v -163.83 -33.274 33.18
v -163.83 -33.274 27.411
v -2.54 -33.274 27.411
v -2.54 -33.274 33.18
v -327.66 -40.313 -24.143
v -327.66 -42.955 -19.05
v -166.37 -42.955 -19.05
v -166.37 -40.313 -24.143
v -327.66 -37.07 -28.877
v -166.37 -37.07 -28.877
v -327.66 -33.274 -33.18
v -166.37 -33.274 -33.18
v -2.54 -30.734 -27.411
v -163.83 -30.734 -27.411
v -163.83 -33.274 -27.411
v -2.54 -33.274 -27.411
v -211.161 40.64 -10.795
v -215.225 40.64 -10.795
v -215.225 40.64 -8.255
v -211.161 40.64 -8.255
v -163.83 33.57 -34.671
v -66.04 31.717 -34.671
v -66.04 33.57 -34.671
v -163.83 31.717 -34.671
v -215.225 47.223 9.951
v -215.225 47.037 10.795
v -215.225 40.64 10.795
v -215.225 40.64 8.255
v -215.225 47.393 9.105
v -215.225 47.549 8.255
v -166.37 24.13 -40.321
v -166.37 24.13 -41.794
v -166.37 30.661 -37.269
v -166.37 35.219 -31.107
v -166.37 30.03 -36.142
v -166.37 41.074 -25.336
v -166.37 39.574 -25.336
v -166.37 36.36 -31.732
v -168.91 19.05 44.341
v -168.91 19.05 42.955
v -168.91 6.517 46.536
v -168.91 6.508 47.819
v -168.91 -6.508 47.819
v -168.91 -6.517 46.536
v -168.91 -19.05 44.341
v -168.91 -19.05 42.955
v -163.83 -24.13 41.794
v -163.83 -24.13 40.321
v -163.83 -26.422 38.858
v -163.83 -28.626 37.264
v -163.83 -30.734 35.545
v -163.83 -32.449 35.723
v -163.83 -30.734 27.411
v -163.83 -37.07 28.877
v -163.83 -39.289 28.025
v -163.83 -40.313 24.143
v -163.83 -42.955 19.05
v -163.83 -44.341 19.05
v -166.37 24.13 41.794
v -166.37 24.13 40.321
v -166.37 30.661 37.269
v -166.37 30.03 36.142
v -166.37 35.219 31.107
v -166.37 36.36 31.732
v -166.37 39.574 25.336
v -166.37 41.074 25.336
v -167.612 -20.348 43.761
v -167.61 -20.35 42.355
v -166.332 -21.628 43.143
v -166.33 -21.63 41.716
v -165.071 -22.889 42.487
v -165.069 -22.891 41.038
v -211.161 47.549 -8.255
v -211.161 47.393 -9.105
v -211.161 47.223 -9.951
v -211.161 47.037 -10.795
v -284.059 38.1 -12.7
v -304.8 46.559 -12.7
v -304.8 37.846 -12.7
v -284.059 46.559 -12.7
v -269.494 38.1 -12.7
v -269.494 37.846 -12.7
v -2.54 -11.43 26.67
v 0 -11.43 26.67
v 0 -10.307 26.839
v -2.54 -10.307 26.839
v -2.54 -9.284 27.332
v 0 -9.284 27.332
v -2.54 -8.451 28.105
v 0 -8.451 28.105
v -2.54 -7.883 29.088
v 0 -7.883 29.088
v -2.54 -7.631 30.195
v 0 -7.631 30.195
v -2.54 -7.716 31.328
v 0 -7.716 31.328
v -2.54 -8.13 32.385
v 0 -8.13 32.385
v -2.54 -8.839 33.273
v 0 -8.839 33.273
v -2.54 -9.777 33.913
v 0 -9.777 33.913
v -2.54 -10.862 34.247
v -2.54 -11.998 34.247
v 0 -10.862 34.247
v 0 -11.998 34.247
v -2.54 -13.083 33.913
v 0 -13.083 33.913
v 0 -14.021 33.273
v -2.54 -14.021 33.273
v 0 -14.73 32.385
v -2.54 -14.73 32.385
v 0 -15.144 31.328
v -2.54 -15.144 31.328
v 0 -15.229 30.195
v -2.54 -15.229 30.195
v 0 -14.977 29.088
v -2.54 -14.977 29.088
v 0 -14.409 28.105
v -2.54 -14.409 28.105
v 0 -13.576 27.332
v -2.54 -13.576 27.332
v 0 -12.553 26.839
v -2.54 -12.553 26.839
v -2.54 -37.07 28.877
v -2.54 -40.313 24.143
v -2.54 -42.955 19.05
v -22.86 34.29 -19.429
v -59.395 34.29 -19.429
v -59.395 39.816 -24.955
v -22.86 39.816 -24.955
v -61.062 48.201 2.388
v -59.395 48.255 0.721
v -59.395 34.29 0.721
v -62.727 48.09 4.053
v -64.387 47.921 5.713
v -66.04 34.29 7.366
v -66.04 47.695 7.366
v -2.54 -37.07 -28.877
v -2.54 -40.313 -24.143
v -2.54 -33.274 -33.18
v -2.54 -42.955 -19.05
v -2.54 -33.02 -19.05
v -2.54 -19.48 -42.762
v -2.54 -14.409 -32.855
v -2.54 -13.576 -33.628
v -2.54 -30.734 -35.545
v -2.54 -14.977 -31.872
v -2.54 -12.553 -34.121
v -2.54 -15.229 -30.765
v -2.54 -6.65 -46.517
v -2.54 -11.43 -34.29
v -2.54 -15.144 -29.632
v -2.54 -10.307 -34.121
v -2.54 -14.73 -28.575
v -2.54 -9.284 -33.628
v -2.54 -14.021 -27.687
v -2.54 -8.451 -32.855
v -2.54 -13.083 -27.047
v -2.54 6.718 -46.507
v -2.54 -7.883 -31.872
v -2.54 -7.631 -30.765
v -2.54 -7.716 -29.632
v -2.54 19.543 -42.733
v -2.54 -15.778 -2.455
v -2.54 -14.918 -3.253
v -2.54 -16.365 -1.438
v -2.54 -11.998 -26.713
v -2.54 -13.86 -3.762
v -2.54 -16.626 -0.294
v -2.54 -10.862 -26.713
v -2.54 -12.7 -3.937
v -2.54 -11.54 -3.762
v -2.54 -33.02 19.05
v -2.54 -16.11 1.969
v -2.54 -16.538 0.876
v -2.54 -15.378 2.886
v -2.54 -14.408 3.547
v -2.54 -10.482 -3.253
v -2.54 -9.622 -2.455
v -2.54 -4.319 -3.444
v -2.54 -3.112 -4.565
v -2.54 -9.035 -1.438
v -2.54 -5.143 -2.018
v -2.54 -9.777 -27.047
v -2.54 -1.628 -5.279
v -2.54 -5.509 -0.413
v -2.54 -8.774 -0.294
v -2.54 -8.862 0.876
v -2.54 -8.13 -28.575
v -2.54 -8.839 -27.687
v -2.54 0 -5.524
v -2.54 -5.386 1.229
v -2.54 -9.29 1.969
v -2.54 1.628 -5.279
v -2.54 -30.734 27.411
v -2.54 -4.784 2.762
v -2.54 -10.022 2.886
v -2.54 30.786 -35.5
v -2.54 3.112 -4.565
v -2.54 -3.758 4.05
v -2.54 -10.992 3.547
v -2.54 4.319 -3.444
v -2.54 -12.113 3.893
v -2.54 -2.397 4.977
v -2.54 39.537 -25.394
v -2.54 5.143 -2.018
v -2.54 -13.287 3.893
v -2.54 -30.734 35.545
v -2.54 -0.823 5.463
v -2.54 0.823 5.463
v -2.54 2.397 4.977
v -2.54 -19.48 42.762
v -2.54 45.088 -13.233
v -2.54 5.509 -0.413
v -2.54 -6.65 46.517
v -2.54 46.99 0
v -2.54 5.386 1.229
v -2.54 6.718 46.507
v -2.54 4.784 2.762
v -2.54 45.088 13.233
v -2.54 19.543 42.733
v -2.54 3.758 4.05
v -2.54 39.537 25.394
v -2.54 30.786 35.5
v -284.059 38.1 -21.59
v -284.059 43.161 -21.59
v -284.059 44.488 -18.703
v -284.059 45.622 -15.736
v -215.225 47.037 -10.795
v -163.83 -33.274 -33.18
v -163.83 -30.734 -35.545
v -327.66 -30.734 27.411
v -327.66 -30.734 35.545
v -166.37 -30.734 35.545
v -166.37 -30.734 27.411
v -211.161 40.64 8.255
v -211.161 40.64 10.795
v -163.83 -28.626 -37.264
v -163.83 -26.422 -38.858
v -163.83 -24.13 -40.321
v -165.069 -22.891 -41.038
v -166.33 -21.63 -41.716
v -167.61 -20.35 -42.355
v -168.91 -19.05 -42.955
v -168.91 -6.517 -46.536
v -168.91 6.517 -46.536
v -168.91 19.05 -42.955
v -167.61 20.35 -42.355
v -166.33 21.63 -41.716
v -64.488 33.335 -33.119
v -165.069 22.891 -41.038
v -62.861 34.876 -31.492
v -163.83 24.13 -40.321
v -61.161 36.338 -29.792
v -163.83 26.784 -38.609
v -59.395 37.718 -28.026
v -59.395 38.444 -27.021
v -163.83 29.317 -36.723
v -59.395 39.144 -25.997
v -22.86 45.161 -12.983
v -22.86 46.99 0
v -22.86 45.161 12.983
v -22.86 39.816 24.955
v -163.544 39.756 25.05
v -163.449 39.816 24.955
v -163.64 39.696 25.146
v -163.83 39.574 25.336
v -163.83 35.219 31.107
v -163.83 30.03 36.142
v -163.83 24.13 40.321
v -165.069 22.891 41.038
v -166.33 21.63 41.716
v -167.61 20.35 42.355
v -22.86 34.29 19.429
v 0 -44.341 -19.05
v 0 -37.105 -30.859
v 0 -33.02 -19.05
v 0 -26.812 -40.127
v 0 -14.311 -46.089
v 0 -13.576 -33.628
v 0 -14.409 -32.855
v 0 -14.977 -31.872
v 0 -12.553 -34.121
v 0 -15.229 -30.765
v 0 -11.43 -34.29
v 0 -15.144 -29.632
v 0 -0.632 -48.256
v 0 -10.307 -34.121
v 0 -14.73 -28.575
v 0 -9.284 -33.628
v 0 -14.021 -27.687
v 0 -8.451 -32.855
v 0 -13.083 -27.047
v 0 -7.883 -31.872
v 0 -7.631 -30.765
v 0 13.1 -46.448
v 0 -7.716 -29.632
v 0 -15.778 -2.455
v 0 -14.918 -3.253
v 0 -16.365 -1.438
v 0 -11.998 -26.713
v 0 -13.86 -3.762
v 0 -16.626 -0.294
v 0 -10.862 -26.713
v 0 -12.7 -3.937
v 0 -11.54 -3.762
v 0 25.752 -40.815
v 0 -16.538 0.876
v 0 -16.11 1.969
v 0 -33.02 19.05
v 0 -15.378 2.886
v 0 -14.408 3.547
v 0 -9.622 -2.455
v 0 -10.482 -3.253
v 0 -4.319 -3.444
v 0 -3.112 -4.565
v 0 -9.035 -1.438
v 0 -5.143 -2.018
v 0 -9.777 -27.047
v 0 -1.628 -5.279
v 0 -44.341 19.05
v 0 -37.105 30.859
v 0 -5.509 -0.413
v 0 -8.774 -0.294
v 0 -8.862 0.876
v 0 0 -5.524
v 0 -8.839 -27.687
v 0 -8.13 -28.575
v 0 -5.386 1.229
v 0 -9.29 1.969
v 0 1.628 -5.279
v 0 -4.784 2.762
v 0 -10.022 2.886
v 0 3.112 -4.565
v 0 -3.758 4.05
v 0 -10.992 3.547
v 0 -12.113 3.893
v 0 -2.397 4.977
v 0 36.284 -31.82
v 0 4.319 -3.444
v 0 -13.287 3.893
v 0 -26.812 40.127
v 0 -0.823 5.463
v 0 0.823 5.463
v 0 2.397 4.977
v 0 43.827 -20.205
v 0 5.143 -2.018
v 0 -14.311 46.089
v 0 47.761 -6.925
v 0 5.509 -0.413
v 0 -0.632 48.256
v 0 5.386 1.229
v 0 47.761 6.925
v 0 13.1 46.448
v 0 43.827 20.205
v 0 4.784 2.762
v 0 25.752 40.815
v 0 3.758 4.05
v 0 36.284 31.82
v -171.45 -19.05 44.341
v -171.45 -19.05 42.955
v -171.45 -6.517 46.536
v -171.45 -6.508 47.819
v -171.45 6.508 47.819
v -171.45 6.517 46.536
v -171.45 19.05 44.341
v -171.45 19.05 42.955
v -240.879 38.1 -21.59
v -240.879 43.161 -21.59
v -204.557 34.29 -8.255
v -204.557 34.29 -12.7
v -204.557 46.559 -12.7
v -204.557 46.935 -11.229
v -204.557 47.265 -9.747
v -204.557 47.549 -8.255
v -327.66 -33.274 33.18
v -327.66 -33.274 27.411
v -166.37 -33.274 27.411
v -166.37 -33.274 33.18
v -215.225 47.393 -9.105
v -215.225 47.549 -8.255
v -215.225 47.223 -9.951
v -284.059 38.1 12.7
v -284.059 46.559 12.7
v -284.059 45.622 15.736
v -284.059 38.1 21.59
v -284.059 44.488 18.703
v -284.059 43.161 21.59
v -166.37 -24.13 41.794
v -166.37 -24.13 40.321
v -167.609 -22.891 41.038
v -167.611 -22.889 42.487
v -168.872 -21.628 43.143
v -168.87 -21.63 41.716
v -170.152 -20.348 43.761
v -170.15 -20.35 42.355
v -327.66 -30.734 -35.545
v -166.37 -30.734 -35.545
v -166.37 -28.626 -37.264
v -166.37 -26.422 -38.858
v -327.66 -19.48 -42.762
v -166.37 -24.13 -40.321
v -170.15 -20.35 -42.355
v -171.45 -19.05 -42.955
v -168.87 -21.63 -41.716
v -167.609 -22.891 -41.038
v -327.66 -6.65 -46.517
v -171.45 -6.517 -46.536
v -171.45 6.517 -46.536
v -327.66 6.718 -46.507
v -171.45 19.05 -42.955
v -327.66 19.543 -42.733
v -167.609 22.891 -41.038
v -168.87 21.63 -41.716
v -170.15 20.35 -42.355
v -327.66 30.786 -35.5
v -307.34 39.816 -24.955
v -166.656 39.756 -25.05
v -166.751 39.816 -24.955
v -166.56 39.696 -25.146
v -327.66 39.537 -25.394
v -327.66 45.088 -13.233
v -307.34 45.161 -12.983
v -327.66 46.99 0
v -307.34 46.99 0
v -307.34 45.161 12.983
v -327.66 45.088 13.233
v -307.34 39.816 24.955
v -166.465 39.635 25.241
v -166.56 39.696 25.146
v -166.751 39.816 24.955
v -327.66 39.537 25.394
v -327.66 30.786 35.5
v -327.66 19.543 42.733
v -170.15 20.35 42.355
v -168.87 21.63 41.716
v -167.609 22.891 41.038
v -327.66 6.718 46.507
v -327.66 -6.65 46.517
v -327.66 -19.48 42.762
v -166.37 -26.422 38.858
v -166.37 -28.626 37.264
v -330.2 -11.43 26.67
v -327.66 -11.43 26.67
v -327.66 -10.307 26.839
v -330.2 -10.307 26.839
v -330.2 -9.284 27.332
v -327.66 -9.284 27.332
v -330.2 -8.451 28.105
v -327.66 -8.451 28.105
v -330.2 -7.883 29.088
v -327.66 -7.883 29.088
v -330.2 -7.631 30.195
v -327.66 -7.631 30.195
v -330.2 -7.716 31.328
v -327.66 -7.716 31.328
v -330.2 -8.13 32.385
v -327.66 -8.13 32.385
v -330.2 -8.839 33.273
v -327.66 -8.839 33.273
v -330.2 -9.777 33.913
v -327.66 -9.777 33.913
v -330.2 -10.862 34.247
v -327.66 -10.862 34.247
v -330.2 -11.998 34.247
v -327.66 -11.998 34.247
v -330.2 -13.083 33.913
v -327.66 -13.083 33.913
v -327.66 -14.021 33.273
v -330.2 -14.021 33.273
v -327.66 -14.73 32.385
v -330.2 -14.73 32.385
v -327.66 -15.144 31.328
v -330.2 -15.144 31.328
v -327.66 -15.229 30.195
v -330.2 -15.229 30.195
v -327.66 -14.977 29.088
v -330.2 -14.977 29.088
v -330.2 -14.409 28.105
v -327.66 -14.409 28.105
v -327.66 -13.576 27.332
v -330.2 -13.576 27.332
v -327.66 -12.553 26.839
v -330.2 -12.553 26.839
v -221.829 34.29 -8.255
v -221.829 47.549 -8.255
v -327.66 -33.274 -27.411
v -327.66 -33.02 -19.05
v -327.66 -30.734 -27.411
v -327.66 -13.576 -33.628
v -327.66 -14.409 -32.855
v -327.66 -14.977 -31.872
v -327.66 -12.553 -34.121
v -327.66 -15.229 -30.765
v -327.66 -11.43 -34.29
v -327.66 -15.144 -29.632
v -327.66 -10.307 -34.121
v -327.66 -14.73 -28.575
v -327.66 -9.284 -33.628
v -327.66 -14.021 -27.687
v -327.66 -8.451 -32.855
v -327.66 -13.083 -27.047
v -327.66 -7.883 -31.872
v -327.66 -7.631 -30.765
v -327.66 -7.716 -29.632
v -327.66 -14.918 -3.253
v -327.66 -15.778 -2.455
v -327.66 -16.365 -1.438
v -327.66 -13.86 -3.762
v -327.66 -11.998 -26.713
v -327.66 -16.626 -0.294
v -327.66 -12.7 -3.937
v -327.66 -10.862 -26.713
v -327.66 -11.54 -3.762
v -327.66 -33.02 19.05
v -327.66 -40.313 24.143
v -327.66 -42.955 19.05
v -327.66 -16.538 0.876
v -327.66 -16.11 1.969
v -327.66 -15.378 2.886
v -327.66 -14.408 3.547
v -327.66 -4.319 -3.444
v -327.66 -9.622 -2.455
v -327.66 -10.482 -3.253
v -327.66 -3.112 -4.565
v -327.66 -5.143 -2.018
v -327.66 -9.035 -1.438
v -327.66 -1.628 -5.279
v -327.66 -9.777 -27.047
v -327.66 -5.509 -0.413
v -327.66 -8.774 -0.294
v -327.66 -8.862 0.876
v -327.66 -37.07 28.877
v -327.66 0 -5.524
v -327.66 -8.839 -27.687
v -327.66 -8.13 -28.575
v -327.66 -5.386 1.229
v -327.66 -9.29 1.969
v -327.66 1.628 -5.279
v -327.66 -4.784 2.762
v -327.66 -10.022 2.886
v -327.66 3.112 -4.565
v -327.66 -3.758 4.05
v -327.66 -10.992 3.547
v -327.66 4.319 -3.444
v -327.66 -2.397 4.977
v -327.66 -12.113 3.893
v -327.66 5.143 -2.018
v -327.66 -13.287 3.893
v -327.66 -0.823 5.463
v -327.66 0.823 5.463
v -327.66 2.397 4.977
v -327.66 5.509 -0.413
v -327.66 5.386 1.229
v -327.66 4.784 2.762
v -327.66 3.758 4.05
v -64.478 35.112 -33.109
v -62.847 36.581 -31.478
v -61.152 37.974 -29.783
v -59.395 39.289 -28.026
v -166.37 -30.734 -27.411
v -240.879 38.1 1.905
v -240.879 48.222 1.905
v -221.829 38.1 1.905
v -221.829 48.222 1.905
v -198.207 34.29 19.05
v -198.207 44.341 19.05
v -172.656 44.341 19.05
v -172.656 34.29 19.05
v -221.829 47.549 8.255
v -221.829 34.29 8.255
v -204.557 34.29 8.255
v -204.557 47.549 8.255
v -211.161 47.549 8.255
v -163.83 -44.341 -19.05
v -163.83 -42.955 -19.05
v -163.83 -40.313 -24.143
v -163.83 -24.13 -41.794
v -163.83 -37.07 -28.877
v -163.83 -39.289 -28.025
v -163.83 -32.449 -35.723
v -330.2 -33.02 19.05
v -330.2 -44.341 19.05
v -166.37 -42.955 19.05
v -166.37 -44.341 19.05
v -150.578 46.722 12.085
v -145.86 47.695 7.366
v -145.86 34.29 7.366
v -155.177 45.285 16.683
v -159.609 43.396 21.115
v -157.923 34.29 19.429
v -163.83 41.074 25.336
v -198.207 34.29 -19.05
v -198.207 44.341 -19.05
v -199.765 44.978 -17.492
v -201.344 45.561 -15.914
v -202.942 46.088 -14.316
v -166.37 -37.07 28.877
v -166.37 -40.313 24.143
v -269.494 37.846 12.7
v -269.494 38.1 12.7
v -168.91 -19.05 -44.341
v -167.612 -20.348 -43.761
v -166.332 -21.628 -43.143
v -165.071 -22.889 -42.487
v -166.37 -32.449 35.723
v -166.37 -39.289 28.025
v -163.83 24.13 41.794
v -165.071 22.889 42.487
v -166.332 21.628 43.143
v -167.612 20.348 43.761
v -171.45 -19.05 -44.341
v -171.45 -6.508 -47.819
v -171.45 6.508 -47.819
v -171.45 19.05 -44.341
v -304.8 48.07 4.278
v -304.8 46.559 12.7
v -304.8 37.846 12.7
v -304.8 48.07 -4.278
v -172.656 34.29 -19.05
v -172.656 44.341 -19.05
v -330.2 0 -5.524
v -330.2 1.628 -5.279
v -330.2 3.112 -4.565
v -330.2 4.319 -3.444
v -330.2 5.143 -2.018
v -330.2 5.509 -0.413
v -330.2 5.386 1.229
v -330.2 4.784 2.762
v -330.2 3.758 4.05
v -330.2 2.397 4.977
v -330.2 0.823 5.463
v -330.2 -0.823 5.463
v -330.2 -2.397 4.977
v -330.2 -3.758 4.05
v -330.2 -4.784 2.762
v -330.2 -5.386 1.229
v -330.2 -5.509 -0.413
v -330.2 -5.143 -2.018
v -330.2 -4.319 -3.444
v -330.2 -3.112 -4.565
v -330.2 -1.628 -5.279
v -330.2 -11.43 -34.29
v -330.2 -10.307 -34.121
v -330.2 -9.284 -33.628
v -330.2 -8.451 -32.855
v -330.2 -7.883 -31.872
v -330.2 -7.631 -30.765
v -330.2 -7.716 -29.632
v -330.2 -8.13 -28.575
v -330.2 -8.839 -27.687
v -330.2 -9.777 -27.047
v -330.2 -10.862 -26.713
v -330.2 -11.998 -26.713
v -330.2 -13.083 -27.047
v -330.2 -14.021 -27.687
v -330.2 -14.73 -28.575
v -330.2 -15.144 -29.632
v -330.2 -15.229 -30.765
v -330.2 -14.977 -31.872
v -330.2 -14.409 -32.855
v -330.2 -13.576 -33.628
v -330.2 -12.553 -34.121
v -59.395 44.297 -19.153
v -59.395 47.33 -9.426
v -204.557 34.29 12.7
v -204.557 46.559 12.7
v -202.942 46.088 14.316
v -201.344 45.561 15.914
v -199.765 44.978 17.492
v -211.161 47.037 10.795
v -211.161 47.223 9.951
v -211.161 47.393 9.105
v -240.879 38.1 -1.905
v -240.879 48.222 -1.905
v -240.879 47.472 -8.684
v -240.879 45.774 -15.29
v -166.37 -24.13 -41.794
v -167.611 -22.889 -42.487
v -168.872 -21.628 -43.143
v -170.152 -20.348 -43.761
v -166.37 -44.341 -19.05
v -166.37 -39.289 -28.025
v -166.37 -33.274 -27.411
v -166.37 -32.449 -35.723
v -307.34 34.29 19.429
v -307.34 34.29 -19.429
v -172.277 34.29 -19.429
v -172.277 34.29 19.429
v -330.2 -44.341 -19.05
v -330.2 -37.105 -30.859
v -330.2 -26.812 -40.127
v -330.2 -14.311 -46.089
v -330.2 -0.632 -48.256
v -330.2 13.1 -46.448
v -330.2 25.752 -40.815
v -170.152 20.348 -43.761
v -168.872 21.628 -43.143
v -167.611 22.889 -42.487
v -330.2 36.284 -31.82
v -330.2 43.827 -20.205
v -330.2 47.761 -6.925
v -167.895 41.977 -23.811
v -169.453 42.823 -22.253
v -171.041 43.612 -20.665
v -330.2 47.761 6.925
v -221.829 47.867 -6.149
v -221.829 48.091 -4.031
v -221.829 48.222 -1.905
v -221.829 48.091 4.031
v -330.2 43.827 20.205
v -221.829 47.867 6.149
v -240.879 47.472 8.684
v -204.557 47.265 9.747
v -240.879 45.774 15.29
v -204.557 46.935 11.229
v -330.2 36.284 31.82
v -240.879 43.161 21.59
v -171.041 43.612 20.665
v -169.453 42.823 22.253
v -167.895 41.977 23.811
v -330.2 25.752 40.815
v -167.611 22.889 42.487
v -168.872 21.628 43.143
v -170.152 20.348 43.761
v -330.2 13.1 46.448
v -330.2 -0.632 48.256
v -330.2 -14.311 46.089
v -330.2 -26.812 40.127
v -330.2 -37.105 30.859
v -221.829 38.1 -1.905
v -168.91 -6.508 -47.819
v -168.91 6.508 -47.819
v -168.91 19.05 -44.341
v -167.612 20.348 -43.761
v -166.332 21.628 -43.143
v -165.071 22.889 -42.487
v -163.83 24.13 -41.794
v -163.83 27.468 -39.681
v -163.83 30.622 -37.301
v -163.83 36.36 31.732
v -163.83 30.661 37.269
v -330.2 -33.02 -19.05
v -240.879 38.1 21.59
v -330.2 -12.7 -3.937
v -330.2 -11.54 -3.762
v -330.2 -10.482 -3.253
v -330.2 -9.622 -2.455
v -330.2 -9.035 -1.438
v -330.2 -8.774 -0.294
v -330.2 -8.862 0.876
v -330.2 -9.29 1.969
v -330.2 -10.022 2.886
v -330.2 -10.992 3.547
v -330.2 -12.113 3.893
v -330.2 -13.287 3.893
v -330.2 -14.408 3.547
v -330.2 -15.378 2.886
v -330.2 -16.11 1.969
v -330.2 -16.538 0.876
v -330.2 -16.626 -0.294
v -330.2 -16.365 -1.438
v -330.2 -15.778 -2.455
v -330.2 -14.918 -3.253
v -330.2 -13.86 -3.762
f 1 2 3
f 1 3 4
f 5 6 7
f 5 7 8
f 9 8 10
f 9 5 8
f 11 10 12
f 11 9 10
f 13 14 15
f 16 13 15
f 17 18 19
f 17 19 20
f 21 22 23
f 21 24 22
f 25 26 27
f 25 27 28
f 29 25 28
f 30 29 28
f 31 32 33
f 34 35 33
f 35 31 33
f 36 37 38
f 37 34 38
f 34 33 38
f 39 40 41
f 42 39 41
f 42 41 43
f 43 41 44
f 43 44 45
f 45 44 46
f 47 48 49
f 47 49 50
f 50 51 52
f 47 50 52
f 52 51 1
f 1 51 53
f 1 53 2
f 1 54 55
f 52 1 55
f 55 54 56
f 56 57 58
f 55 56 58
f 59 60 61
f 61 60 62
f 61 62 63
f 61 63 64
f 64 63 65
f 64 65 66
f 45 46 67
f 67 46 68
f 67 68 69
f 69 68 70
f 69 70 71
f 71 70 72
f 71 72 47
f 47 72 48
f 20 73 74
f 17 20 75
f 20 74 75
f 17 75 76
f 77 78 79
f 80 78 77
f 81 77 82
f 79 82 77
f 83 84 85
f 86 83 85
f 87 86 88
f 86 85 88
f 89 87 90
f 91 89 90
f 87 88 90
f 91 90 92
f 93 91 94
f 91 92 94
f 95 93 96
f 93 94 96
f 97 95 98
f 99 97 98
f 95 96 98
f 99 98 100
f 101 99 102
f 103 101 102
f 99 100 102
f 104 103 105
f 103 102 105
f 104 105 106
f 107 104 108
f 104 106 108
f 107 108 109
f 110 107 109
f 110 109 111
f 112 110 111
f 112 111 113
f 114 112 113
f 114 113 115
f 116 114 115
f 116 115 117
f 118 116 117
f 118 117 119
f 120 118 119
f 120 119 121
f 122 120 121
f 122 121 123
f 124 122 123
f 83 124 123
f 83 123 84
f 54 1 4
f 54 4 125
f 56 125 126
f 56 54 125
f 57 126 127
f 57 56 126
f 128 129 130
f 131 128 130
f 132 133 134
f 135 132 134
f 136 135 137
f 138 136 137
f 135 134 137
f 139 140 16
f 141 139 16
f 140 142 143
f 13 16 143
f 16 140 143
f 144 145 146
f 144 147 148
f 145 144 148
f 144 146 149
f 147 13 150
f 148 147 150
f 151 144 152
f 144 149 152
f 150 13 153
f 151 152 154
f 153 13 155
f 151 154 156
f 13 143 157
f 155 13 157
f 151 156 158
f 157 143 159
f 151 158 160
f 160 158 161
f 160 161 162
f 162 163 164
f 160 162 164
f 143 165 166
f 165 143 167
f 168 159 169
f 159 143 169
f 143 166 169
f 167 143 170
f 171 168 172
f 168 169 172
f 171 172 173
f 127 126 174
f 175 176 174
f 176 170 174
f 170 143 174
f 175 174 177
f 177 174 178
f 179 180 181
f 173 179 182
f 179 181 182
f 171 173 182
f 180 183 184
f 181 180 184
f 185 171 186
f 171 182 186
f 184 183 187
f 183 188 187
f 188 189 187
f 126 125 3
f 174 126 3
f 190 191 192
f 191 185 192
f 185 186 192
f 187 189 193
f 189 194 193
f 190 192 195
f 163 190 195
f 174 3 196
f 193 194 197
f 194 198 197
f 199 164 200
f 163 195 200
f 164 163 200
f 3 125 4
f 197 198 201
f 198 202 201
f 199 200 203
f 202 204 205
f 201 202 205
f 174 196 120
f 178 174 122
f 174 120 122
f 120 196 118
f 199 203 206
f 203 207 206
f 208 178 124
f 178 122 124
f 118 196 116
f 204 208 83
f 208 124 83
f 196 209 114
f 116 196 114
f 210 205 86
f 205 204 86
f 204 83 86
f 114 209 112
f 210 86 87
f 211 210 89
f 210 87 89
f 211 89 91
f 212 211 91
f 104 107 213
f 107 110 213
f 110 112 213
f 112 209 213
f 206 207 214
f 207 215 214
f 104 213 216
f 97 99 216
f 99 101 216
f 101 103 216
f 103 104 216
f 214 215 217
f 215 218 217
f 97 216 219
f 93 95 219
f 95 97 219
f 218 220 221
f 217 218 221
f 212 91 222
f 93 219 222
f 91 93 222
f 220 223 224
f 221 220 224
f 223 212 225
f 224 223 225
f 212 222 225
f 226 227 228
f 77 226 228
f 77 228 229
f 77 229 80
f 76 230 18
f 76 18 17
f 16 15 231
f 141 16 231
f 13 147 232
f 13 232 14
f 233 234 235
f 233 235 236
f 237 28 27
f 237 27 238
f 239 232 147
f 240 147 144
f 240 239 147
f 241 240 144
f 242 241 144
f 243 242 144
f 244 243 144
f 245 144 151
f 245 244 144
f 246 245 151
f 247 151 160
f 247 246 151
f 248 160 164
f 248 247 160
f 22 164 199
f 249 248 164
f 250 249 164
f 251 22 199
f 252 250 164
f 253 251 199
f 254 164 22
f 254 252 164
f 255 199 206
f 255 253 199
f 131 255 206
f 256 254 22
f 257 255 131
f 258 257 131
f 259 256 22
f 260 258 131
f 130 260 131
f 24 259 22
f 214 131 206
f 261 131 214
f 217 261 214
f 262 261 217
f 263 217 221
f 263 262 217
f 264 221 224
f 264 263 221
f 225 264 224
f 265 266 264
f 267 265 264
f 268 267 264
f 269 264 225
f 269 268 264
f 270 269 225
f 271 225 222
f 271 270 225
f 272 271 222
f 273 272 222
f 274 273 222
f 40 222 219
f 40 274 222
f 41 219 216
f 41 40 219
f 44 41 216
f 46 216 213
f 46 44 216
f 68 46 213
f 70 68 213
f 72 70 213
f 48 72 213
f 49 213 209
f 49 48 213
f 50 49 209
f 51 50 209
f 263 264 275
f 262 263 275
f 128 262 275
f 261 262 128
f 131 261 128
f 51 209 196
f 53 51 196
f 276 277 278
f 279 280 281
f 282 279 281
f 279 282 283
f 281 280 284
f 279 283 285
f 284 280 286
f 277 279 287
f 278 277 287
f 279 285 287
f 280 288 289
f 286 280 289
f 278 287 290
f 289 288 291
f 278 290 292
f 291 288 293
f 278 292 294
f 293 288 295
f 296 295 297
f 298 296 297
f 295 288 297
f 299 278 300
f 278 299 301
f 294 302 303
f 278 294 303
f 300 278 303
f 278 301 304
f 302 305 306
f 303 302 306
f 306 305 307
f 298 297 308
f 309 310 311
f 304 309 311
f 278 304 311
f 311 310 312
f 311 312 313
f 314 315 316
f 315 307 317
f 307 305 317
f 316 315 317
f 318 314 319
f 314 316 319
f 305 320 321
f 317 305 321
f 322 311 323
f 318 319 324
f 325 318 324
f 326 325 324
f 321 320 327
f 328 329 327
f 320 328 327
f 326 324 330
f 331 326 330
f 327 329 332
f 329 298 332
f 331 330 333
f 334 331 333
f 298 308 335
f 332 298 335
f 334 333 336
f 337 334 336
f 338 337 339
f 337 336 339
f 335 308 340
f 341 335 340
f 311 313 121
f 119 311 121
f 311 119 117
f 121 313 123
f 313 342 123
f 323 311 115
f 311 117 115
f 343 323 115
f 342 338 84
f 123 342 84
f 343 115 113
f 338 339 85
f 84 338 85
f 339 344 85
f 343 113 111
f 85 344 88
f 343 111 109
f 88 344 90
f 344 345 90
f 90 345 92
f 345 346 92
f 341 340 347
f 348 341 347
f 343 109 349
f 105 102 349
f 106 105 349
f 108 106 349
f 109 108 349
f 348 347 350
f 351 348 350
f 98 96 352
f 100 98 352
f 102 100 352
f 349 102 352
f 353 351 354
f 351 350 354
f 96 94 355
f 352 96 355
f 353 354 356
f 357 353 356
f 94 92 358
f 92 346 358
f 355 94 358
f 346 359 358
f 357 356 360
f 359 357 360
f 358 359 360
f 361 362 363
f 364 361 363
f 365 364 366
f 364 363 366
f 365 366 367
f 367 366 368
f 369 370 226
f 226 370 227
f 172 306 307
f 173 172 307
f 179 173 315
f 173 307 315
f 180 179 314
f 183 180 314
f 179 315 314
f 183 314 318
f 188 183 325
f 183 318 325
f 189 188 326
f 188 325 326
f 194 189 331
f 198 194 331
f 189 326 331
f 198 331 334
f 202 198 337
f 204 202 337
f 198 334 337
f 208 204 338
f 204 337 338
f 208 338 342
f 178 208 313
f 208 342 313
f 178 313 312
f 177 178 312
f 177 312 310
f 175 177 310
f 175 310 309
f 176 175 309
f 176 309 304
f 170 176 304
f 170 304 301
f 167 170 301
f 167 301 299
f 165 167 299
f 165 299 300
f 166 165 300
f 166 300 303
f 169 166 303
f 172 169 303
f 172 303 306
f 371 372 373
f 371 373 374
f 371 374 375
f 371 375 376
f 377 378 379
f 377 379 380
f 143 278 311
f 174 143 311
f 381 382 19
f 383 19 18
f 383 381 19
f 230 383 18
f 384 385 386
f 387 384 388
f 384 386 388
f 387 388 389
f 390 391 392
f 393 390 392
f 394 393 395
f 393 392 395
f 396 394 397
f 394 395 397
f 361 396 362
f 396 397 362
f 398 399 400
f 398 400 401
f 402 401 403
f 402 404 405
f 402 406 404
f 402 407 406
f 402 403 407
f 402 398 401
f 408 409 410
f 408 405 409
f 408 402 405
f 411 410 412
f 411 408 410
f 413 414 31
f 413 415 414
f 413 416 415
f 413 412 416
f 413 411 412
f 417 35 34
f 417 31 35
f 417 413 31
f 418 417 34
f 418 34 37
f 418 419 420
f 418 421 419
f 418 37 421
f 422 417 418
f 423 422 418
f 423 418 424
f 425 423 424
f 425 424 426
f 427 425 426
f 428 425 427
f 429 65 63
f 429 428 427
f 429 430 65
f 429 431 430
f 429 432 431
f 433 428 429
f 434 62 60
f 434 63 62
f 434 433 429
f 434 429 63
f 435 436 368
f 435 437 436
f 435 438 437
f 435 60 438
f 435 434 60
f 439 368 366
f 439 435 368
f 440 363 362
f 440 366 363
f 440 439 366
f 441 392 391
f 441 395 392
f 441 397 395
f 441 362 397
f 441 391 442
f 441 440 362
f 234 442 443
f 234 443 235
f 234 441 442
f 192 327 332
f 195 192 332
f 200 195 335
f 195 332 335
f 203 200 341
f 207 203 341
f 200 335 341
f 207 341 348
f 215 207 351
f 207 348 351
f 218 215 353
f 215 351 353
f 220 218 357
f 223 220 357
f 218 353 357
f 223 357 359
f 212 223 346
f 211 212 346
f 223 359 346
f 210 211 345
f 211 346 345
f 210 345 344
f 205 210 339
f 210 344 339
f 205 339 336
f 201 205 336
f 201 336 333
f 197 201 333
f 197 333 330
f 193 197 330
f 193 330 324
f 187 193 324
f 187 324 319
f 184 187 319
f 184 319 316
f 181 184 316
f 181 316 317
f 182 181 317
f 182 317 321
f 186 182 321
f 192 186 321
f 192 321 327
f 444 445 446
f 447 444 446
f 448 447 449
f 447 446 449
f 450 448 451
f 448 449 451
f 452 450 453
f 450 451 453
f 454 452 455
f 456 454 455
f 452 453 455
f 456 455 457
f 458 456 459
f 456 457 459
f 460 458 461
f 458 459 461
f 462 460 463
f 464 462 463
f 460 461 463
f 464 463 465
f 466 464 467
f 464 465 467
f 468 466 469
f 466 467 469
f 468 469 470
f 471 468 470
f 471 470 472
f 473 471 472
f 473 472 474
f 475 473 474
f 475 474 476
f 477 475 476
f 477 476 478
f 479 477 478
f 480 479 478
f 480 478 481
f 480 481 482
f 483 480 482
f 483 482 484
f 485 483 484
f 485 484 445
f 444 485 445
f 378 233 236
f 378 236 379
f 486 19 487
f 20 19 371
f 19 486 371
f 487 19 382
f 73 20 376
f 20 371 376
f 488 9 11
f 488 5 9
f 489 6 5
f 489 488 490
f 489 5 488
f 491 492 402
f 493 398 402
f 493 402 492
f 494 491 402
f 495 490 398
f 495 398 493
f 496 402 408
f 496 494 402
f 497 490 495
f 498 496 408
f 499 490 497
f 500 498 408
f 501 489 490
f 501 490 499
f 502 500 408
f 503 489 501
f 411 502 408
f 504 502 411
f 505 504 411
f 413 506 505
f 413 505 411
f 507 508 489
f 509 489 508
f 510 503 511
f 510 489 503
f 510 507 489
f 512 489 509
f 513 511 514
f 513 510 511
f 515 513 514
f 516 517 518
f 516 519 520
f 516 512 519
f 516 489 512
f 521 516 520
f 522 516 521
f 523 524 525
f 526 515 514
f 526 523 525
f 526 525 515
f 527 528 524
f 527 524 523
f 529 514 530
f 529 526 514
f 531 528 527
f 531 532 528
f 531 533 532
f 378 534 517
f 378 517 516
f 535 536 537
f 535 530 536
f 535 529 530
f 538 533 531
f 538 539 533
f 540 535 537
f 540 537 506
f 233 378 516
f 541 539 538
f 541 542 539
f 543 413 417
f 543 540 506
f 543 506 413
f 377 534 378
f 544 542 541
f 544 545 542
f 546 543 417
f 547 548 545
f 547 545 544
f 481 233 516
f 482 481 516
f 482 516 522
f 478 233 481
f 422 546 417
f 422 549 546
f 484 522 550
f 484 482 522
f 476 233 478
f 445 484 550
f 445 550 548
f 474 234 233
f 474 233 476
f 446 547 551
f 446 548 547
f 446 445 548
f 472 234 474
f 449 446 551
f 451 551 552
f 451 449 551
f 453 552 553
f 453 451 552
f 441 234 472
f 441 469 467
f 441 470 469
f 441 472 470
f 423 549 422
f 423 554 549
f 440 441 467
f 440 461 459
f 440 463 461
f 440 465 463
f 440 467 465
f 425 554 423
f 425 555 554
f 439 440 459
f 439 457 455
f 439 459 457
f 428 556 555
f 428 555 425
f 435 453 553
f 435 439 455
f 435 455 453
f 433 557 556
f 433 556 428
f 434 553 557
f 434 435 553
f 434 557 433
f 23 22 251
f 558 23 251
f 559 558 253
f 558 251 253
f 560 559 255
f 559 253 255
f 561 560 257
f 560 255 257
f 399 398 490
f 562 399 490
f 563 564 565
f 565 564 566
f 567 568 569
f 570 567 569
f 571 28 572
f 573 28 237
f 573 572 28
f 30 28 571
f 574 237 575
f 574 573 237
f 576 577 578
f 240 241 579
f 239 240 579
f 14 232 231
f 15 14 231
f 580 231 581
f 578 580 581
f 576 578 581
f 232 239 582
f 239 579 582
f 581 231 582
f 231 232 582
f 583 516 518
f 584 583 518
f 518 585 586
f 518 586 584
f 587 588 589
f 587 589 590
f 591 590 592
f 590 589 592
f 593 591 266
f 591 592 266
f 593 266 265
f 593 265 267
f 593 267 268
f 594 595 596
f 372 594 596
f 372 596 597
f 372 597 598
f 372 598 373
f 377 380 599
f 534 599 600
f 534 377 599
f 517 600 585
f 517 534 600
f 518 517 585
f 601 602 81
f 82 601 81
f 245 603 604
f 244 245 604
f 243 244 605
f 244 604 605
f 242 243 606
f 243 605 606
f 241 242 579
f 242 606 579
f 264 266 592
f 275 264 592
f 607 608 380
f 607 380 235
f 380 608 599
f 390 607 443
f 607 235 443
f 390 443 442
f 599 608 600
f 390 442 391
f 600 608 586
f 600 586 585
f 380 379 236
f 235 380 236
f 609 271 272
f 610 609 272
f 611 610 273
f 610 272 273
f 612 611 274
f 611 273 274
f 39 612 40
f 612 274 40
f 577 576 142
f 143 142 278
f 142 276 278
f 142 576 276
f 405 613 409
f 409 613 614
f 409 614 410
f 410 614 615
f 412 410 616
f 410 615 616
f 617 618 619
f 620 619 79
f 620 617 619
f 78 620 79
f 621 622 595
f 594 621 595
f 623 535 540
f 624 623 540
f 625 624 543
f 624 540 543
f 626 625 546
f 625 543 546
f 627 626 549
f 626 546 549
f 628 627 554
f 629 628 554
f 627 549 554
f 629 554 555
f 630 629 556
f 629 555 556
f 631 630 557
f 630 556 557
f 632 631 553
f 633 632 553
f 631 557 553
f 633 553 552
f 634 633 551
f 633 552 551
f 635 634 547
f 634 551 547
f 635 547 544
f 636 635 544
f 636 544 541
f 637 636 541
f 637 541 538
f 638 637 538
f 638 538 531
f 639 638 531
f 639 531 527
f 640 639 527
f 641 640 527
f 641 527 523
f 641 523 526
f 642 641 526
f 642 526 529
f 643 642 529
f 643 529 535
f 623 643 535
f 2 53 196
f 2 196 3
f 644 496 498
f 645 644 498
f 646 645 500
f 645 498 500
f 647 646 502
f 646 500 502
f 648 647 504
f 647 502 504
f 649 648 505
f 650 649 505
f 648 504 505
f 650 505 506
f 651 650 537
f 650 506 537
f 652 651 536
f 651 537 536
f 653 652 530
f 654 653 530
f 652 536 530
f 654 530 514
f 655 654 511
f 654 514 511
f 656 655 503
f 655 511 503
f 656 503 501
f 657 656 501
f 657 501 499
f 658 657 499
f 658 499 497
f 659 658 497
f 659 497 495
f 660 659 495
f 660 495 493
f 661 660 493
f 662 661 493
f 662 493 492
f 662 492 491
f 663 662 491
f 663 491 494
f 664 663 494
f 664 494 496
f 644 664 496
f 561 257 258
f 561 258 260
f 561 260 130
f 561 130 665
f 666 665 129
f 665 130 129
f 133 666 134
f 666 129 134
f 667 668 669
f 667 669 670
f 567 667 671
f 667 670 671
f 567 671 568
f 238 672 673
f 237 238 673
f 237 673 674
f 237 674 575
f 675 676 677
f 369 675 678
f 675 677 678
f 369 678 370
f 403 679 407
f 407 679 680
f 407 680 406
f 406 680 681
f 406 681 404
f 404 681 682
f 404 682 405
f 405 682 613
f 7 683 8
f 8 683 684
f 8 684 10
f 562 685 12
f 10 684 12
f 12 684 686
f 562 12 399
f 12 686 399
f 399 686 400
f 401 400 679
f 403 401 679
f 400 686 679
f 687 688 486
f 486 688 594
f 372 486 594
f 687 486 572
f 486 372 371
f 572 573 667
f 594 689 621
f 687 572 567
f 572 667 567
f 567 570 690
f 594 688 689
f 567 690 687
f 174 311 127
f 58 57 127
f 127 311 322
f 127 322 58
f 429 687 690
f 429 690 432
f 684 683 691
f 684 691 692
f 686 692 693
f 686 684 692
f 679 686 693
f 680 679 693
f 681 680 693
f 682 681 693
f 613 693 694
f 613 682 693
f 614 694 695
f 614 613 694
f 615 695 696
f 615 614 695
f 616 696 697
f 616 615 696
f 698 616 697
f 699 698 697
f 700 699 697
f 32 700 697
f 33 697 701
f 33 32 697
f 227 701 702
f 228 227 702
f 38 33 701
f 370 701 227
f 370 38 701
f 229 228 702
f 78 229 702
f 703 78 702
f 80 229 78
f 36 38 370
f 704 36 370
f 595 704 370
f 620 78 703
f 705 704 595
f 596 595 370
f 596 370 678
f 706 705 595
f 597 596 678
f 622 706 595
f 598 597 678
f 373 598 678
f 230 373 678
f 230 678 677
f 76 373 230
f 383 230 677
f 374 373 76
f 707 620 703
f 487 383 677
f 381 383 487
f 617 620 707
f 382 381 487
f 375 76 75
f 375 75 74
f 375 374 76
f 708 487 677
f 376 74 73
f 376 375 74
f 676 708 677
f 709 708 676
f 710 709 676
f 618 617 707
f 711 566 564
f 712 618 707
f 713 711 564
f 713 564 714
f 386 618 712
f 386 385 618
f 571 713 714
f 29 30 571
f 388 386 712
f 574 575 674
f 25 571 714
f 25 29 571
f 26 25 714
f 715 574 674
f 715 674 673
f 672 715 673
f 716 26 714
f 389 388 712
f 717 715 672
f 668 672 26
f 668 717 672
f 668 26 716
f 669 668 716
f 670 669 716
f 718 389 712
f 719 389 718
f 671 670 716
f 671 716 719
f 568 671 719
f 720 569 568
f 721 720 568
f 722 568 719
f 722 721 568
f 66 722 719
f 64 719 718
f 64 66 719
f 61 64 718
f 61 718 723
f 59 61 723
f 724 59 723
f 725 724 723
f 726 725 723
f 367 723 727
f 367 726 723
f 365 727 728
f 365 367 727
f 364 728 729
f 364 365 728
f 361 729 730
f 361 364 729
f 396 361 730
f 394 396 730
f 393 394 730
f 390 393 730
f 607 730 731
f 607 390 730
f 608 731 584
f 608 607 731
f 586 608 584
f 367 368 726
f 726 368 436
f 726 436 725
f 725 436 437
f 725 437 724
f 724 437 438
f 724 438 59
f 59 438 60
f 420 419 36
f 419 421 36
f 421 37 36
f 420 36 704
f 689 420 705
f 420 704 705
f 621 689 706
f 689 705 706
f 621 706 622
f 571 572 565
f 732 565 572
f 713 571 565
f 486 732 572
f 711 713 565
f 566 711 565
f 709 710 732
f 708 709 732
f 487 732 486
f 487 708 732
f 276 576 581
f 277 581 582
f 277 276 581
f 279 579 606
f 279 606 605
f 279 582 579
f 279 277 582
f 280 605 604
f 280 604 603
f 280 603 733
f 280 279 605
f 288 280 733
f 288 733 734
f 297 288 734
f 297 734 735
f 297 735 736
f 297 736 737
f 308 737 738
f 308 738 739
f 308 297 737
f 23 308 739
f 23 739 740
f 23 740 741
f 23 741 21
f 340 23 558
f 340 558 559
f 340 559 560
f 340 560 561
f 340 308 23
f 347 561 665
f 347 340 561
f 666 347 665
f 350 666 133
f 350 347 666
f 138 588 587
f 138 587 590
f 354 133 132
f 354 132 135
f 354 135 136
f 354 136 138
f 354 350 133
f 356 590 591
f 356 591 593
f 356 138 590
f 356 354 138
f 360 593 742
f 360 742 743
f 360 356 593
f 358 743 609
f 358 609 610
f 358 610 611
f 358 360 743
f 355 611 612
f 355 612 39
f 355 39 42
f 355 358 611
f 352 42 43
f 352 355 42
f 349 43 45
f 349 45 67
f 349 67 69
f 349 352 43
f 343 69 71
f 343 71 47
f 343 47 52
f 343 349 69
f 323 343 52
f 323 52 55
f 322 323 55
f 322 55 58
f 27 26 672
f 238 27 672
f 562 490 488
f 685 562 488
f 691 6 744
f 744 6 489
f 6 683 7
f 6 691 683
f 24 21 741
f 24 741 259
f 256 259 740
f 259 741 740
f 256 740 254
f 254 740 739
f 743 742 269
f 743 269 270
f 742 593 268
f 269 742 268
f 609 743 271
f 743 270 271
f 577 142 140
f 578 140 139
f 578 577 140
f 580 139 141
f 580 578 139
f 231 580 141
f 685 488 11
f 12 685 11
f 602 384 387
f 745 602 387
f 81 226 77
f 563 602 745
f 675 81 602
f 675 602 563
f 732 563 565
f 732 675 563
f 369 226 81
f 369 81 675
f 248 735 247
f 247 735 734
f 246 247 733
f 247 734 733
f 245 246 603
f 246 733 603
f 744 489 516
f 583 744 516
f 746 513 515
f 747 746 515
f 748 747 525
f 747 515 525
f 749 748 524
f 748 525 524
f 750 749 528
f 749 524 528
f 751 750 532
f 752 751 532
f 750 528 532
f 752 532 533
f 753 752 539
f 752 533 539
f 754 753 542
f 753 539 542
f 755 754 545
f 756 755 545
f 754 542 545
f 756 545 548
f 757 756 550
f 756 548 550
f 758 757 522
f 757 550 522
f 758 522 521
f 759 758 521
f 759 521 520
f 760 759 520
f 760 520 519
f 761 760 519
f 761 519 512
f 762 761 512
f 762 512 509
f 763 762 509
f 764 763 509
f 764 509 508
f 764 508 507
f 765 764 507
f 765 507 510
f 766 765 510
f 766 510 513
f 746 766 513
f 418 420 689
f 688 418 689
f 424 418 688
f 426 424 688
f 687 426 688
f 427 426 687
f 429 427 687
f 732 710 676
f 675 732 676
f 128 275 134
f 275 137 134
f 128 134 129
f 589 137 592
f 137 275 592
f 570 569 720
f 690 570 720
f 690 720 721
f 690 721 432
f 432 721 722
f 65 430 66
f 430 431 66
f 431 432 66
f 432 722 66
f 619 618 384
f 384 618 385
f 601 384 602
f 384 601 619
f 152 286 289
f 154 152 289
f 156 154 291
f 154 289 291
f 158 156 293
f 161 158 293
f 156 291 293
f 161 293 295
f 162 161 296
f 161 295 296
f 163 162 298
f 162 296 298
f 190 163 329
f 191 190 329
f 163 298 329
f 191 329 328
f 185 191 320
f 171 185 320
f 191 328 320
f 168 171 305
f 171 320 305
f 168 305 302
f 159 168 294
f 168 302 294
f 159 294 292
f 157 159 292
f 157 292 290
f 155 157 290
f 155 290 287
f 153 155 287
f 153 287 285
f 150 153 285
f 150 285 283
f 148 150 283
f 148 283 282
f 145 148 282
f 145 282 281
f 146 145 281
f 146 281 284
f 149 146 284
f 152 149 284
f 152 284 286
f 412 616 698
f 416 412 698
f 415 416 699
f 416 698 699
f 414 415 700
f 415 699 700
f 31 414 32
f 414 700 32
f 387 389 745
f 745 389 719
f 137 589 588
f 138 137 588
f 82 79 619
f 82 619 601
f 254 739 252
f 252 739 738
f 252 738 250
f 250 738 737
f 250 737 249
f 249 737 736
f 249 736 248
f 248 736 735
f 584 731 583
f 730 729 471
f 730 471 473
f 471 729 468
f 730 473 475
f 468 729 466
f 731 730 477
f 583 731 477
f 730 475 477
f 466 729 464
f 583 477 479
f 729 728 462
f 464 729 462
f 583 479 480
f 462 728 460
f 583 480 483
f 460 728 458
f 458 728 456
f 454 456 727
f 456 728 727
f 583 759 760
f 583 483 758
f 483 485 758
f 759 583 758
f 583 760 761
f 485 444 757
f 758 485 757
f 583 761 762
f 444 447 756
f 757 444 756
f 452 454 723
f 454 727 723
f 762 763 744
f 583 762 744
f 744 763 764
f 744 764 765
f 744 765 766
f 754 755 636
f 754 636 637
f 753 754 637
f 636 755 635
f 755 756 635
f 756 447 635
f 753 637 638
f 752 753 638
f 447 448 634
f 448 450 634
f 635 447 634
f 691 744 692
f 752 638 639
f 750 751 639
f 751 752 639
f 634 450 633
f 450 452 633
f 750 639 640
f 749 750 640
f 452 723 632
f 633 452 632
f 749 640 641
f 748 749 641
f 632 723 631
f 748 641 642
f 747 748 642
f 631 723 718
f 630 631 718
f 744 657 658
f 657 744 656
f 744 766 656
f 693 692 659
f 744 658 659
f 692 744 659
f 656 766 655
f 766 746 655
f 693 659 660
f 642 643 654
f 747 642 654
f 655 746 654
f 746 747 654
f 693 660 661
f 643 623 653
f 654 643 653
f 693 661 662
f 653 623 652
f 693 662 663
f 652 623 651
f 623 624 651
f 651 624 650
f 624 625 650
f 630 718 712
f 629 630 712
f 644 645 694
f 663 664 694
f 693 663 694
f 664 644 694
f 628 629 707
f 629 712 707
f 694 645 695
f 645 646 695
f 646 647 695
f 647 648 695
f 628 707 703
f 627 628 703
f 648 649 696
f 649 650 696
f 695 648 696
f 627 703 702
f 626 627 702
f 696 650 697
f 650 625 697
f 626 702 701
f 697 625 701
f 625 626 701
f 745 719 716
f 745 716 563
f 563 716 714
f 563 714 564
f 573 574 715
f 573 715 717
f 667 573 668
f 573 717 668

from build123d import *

# Parameters (mm, degrees)
SKETCH1_R                   = 49.53
CAN_BODY_DEPTH              = 330.2
SEPARATION_DEPTH            = 304.8
SEPARATION_DEPTH_BACK       = 304.8
SHELL1_START                = -327.66
SHELL1_OUTLINE_R            = 46.99
SHELL1_DEPTH                = 161.29
SHELL2_START                = -168.91
SHELL2_OUTLINE_R            = 46.99
SHELL2_DEPTH                = 166.37
SKETCH3_R                   = 3.81
SKETCH3_R_2                 = 3.937
CORD_AND_ROD_CUTS_DEPTH     = 344.424
BOTTOM_RETENTION_RAIL_DEPTH = 140.97
POWER_SWITCH_SLOT_DEPTH     = 35.56
TOP_RETENTION_RIDGE_DEPTH   = 140.97
SKETCH9_R                   = 5.5245
CENTER_HOLE_DEPTH           = 368.3
TOP_GUIDE_RAIL_DEPTH        = 163.83
BOTTOM_START                = -166.37
BOTTOM_GUIDE_RAIL_DEPTH     = 163.576
GOPRO_SLOT_DEPTH            = 2.54
GOPRO_SLOT_DEPTH_BACK       = 96.012
GOPRO_SLOT_START            = -68.58
SKETCH14_W                  = 42.037
SKETCH14_H                  = 58.42
SKETCH13_W                  = 132.445406608
SKETCH13_H                  = 121.677106584
SKETCH13_R                  = 48.26
TOLERANCE_ADJUST_DEPTH      = 343.662
GOPRO_SLOT_CORNERS_DEPTH    = 96.012
SKETCH18_W                  = 16.51
SKETCH18_H                  = 25.4
RUNCAM_CAMERA_CUTOUT_DEPTH  = 17.272
SKETCH19_W                  = 4.064
SKETCH19_H                  = 2.54
CUT_EXTRUDE1_DEPTH          = 7.62
CUT_EXTRUDE2_DEPTH          = 10.16
SKETCH21_W                  = 35.306
SKETCH21_H                  = 25.4
CUT_EXTRUDE3_DEPTH          = 10.414


# Read off the part's stored shape, not the designer's step: Shell1, Shell2
with BuildPart() as part:
    # Sketch1 → Can Body (new body)
    with BuildSketch(Plane(origin=(0, 0, 0), x_dir=(0, 0, -1), z_dir=(1, 0, 0))):
        Circle(SKETCH1_R)
    extrude(amount=-CAN_BODY_DEPTH)

    # Sketch2 → Separation (cut, two sides: drawn at the far end of the back side and taken through both)
    with BuildSketch(Plane.XY.offset(-SEPARATION_DEPTH_BACK)):
        Polygon((-168.91, 19.05), (-168.91, -19.05), (-163.83, -24.13), (-163.83, -49.53), (-166.37, -49.53), (-166.37, -24.13), (-171.45, -19.05), (-171.45, 19.05), (-166.37, 24.13), (-166.37, 49.53), (-163.83, 49.53), (-163.83, 24.13), align=None)
    extrude(amount=SEPARATION_DEPTH + SEPARATION_DEPTH_BACK, mode=Mode.SUBTRACT)


with BuildPart() as separation_piece_1:
    # of the separate pieces the step leaves, piece 1, a body of its own (separation_pieces)
    add(part.part.solids().sort_by_distance((0, 0, -49.53))[0])

    # Shell2 outline → Shell2 (cut)
    with BuildSketch(Plane.YZ.offset(SHELL2_START)):
        Circle(SHELL2_OUTLINE_R)
    extrude(amount=SHELL2_DEPTH, mode=Mode.SUBTRACT)


with BuildPart() as separation_piece_2:
    # of the separate pieces the step leaves, piece 2, a body of its own (separation_pieces)
    add(part.part.solids().sort_by_distance((-171.45, 0, -49.53))[0])

    # Shell1 outline → Shell1 (cut)
    with BuildSketch(Plane.YZ.offset(SHELL1_START)):
        Circle(SHELL1_OUTLINE_R)
    extrude(amount=SHELL1_DEPTH, mode=Mode.SUBTRACT)


with BuildPart() as cord_and_rod_cuts_tool:
    # Sketch3 → Cord and rod cuts (new body)
    with BuildSketch(Plane(origin=(0, 0, 0), x_dir=(0, 0, -1), z_dir=(1, 0, 0))):
        with Locations((-30.48, -11.43)):
            Circle(SKETCH3_R)
        with Locations((30.48, -11.43)):
            Circle(SKETCH3_R)
        with Locations((0, -12.7)):
            Circle(SKETCH3_R_2)
        Polygon((19.05, -33.02), (-19.05, -33.02), (-19.05, -45.72), (-19.05, -57.214809543), (19.05, -57.214809543), (19.05, -45.72), align=None)
    extrude(amount=-CORD_AND_ROD_CUTS_DEPTH)


with BuildPart() as separation_piece_1_1:
    add(separation_piece_1.part)

    # Cord and rod cuts: cut by cord_and_rod_cuts_tool
    add(cord_and_rod_cuts_tool.part, mode=Mode.SUBTRACT)

    # Sketch7 → Top Retention Ridge (add)
    with BuildSketch(Plane.ZY.offset(163.83)):
        with BuildLine():
            Line((19.428741027, 34.29), (-19.428741027, 34.29))
            Line((-19.428741027, 34.29), (-24.954796178, 39.81605515))
            ThreePointArc((-24.954796178, 39.81605515), (0, 46.99), (24.954796178, 39.81605515))
            Line((24.954796178, 39.81605515), (19.428741027, 34.29))
        make_face()
    extrude(amount=-TOP_RETENTION_RIDGE_DEPTH)


with BuildPart() as separation_piece_2_1:
    add(separation_piece_2.part)

    # Cord and rod cuts: cut by cord_and_rod_cuts_tool
    add(cord_and_rod_cuts_tool.part, mode=Mode.SUBTRACT)

    # Sketch4 → Bottom Retention Rail (add)
    with BuildSketch(Plane(origin=(-166.37, 0, 0), x_dir=(0, 0, -1), z_dir=(1, 0, 0))):
        with BuildLine():
            Line((-7.62, 34.29), (-19.428741027, 34.29))
            Line((-19.428741027, 34.29), (-24.954796178, 39.81605515))
            ThreePointArc((-24.954796178, 39.81605515), (0, 46.99), (24.954796178, 39.81605515))
            Line((24.954796178, 39.81605515), (19.428741027, 34.29))
            Line((19.428741027, 34.29), (7.62, 34.29))
            Line((7.62, 34.29), (-7.62, 34.29))
        make_face()
    extrude(amount=-BOTTOM_RETENTION_RAIL_DEPTH)

    # Sketch5 → Power Switch Slot (cut)
    with BuildSketch(Plane(origin=(0, 49.53, 0), x_dir=(1, 0, 0), z_dir=(0, 1, 0))):
        Polygon((-204.557426539, 12.7), (-204.557426539, -12.7), (-198.207426539, -19.05), (-172.656179285, -19.05), (-166.37, -25.336179285), (-166.37, 25.336179285), (-172.656179285, 19.05), (-198.207426539, 19.05), align=None)
    extrude(amount=-POWER_SWITCH_SLOT_DEPTH, mode=Mode.SUBTRACT)


with BuildPart() as center_hole_tool:
    # Sketch9 → Center Hole (new body)
    with BuildSketch(Plane(origin=(0, 0, 0), x_dir=(0, 0, -1), z_dir=(1, 0, 0))):
        Circle(SKETCH9_R)
    extrude(amount=-CENTER_HOLE_DEPTH)


with BuildPart() as separation_piece_1_2:
    add(separation_piece_1_1.part)

    # Center Hole: cut by center_hole_tool
    add(center_hole_tool.part, mode=Mode.SUBTRACT)

    # Sketch10 → Top Guide Rail (add)
    with BuildSketch(Plane(origin=(0, 0, 0), x_dir=(0, 0, -1), z_dir=(1, 0, 0))):
        Polygon((-38.841242823, -30.734), (-27.411242823, -30.734), (-27.411242823, -33.274), (-36.688715213, -33.274), (-37.233551179, -31.620508339), align=None)
        Polygon((37.233551179, -31.620508339), (38.841242823, -30.734), (27.411242823, -30.734), (27.411242823, -33.274), (36.688715213, -33.274), align=None)
    extrude(amount=-TOP_GUIDE_RAIL_DEPTH)

    # Sketch14 → GoPro Slot (cut, two sides: drawn at the far end of the back side and taken through both)
    with BuildSketch(Plane(origin=(0, 0, 0), x_dir=(0, 0, -1), z_dir=(1, 0, 0)).offset(GOPRO_SLOT_START - GOPRO_SLOT_DEPTH_BACK)):
        with Locations((13.6525, 29.21)):
            Rectangle(SKETCH14_W, SKETCH14_H)
    extrude(amount=GOPRO_SLOT_DEPTH + GOPRO_SLOT_DEPTH_BACK, mode=Mode.SUBTRACT)


with BuildPart() as separation_piece_2_2:
    add(separation_piece_2_1.part)

    # Center Hole: cut by center_hole_tool
    add(center_hole_tool.part, mode=Mode.SUBTRACT)

    # Sketch10<2> → Bottom Guide Rail (add)
    with BuildSketch(Plane(origin=(0, 0, 0), x_dir=(0, 0, -1), z_dir=(1, 0, 0)).offset(BOTTOM_START)):
        Polygon((-38.841242823, -30.734), (-27.411242823, -30.734), (-27.411242823, -33.274), (-36.688715213, -33.274), (-37.233551179, -31.620508339), align=None)
        Polygon((37.233551179, -31.620508339), (38.841242823, -30.734), (27.411242823, -30.734), (27.411242823, -33.274), (36.688715213, -33.274), align=None)
    extrude(amount=-BOTTOM_GUIDE_RAIL_DEPTH)


with BuildPart() as tolerance_adjust_tool:
    # Sketch13 → Tolerance Adjust (new body)
    with BuildSketch(Plane(origin=(0, 0, 0), x_dir=(0, 0, -1), z_dir=(1, 0, 0))):
        Rectangle(SKETCH13_W, SKETCH13_H)
        Circle(SKETCH13_R, mode=Mode.SUBTRACT)
    extrude(amount=-TOLERANCE_ADJUST_DEPTH)


with BuildPart() as separation_piece_1_3:
    add(separation_piece_1_2.part)

    # Tolerance Adjust: cut by tolerance_adjust_tool
    add(tolerance_adjust_tool.part, mode=Mode.SUBTRACT)

    # Sketch15 → GoPro Slot Corners (cut)
    with BuildSketch(Plane(origin=(0, 0, 0), x_dir=(1, 0, 0), z_dir=(0, 1, 0))):
        Polygon((-66.04, 34.671), (-59.39461047, 28.02561047), (-59.39461047, -0.72061047), (-66.04, -7.366), align=None)
        Polygon((-163.83, 34.671), (-145.859820715, 34.671), (-145.859820715, -7.366), (-163.83, -25.336179285), align=None)
    extrude(amount=GOPRO_SLOT_CORNERS_DEPTH, mode=Mode.SUBTRACT)


with BuildPart() as separation_piece_2_3:
    add(separation_piece_2_2.part)

    # Tolerance Adjust: cut by tolerance_adjust_tool
    add(tolerance_adjust_tool.part, mode=Mode.SUBTRACT)

    # Sketch18 → Runcam Camera Cutout (cut)
    with BuildSketch(Plane(origin=(-204.557426539, 0, 0), x_dir=(0, 0, -1), z_dir=(1, 0, 0))):
        with Locations((0, 43.18)):
            Rectangle(SKETCH18_W, SKETCH18_H)
    extrude(amount=-RUNCAM_CAMERA_CUTOUT_DEPTH, mode=Mode.SUBTRACT)

    # Sketch19 → Cut-Extrude1 (cut)
    with BuildSketch(Plane(origin=(0, 48.26, 0), x_dir=(1, 0, 0), z_dir=(0, 1, 0))):
        with Locations((-213.193426539, 9.525)):
            Rectangle(SKETCH19_W, SKETCH19_H)
        with Locations((-213.193426539, -9.525)):
            Rectangle(SKETCH19_W, SKETCH19_H)
    extrude(amount=-CUT_EXTRUDE1_DEPTH, mode=Mode.SUBTRACT)

    # Sketch20 → Cut-Extrude2 (cut)
    with BuildSketch(Plane(origin=(0, 48.26, 0), x_dir=(1, 0, 0), z_dir=(0, 1, 0))):
        Polygon((-240.879426539, 1.905), (-240.879426539, 21.59), (-284.059426539, 21.59), (-284.059426539, -21.59), (-240.879426539, -21.59), (-240.879426539, -1.905), (-221.829426539, -1.905), (-221.829426539, 1.905), align=None)
    extrude(amount=-CUT_EXTRUDE2_DEPTH, mode=Mode.SUBTRACT)

    # Sketch21 → Cut-Extrude3 (cut)
    with BuildSketch(Plane(origin=(0, 48.26, 0), x_dir=(1, 0, 0), z_dir=(0, 1, 0))):
        with Locations((-287.147, 0)):
            Rectangle(SKETCH21_W, SKETCH21_H)
    extrude(amount=-CUT_EXTRUDE3_DEPTH, mode=Mode.SUBTRACT)


solid = Compound([separation_piece_1_3.part, separation_piece_2_3.part])
